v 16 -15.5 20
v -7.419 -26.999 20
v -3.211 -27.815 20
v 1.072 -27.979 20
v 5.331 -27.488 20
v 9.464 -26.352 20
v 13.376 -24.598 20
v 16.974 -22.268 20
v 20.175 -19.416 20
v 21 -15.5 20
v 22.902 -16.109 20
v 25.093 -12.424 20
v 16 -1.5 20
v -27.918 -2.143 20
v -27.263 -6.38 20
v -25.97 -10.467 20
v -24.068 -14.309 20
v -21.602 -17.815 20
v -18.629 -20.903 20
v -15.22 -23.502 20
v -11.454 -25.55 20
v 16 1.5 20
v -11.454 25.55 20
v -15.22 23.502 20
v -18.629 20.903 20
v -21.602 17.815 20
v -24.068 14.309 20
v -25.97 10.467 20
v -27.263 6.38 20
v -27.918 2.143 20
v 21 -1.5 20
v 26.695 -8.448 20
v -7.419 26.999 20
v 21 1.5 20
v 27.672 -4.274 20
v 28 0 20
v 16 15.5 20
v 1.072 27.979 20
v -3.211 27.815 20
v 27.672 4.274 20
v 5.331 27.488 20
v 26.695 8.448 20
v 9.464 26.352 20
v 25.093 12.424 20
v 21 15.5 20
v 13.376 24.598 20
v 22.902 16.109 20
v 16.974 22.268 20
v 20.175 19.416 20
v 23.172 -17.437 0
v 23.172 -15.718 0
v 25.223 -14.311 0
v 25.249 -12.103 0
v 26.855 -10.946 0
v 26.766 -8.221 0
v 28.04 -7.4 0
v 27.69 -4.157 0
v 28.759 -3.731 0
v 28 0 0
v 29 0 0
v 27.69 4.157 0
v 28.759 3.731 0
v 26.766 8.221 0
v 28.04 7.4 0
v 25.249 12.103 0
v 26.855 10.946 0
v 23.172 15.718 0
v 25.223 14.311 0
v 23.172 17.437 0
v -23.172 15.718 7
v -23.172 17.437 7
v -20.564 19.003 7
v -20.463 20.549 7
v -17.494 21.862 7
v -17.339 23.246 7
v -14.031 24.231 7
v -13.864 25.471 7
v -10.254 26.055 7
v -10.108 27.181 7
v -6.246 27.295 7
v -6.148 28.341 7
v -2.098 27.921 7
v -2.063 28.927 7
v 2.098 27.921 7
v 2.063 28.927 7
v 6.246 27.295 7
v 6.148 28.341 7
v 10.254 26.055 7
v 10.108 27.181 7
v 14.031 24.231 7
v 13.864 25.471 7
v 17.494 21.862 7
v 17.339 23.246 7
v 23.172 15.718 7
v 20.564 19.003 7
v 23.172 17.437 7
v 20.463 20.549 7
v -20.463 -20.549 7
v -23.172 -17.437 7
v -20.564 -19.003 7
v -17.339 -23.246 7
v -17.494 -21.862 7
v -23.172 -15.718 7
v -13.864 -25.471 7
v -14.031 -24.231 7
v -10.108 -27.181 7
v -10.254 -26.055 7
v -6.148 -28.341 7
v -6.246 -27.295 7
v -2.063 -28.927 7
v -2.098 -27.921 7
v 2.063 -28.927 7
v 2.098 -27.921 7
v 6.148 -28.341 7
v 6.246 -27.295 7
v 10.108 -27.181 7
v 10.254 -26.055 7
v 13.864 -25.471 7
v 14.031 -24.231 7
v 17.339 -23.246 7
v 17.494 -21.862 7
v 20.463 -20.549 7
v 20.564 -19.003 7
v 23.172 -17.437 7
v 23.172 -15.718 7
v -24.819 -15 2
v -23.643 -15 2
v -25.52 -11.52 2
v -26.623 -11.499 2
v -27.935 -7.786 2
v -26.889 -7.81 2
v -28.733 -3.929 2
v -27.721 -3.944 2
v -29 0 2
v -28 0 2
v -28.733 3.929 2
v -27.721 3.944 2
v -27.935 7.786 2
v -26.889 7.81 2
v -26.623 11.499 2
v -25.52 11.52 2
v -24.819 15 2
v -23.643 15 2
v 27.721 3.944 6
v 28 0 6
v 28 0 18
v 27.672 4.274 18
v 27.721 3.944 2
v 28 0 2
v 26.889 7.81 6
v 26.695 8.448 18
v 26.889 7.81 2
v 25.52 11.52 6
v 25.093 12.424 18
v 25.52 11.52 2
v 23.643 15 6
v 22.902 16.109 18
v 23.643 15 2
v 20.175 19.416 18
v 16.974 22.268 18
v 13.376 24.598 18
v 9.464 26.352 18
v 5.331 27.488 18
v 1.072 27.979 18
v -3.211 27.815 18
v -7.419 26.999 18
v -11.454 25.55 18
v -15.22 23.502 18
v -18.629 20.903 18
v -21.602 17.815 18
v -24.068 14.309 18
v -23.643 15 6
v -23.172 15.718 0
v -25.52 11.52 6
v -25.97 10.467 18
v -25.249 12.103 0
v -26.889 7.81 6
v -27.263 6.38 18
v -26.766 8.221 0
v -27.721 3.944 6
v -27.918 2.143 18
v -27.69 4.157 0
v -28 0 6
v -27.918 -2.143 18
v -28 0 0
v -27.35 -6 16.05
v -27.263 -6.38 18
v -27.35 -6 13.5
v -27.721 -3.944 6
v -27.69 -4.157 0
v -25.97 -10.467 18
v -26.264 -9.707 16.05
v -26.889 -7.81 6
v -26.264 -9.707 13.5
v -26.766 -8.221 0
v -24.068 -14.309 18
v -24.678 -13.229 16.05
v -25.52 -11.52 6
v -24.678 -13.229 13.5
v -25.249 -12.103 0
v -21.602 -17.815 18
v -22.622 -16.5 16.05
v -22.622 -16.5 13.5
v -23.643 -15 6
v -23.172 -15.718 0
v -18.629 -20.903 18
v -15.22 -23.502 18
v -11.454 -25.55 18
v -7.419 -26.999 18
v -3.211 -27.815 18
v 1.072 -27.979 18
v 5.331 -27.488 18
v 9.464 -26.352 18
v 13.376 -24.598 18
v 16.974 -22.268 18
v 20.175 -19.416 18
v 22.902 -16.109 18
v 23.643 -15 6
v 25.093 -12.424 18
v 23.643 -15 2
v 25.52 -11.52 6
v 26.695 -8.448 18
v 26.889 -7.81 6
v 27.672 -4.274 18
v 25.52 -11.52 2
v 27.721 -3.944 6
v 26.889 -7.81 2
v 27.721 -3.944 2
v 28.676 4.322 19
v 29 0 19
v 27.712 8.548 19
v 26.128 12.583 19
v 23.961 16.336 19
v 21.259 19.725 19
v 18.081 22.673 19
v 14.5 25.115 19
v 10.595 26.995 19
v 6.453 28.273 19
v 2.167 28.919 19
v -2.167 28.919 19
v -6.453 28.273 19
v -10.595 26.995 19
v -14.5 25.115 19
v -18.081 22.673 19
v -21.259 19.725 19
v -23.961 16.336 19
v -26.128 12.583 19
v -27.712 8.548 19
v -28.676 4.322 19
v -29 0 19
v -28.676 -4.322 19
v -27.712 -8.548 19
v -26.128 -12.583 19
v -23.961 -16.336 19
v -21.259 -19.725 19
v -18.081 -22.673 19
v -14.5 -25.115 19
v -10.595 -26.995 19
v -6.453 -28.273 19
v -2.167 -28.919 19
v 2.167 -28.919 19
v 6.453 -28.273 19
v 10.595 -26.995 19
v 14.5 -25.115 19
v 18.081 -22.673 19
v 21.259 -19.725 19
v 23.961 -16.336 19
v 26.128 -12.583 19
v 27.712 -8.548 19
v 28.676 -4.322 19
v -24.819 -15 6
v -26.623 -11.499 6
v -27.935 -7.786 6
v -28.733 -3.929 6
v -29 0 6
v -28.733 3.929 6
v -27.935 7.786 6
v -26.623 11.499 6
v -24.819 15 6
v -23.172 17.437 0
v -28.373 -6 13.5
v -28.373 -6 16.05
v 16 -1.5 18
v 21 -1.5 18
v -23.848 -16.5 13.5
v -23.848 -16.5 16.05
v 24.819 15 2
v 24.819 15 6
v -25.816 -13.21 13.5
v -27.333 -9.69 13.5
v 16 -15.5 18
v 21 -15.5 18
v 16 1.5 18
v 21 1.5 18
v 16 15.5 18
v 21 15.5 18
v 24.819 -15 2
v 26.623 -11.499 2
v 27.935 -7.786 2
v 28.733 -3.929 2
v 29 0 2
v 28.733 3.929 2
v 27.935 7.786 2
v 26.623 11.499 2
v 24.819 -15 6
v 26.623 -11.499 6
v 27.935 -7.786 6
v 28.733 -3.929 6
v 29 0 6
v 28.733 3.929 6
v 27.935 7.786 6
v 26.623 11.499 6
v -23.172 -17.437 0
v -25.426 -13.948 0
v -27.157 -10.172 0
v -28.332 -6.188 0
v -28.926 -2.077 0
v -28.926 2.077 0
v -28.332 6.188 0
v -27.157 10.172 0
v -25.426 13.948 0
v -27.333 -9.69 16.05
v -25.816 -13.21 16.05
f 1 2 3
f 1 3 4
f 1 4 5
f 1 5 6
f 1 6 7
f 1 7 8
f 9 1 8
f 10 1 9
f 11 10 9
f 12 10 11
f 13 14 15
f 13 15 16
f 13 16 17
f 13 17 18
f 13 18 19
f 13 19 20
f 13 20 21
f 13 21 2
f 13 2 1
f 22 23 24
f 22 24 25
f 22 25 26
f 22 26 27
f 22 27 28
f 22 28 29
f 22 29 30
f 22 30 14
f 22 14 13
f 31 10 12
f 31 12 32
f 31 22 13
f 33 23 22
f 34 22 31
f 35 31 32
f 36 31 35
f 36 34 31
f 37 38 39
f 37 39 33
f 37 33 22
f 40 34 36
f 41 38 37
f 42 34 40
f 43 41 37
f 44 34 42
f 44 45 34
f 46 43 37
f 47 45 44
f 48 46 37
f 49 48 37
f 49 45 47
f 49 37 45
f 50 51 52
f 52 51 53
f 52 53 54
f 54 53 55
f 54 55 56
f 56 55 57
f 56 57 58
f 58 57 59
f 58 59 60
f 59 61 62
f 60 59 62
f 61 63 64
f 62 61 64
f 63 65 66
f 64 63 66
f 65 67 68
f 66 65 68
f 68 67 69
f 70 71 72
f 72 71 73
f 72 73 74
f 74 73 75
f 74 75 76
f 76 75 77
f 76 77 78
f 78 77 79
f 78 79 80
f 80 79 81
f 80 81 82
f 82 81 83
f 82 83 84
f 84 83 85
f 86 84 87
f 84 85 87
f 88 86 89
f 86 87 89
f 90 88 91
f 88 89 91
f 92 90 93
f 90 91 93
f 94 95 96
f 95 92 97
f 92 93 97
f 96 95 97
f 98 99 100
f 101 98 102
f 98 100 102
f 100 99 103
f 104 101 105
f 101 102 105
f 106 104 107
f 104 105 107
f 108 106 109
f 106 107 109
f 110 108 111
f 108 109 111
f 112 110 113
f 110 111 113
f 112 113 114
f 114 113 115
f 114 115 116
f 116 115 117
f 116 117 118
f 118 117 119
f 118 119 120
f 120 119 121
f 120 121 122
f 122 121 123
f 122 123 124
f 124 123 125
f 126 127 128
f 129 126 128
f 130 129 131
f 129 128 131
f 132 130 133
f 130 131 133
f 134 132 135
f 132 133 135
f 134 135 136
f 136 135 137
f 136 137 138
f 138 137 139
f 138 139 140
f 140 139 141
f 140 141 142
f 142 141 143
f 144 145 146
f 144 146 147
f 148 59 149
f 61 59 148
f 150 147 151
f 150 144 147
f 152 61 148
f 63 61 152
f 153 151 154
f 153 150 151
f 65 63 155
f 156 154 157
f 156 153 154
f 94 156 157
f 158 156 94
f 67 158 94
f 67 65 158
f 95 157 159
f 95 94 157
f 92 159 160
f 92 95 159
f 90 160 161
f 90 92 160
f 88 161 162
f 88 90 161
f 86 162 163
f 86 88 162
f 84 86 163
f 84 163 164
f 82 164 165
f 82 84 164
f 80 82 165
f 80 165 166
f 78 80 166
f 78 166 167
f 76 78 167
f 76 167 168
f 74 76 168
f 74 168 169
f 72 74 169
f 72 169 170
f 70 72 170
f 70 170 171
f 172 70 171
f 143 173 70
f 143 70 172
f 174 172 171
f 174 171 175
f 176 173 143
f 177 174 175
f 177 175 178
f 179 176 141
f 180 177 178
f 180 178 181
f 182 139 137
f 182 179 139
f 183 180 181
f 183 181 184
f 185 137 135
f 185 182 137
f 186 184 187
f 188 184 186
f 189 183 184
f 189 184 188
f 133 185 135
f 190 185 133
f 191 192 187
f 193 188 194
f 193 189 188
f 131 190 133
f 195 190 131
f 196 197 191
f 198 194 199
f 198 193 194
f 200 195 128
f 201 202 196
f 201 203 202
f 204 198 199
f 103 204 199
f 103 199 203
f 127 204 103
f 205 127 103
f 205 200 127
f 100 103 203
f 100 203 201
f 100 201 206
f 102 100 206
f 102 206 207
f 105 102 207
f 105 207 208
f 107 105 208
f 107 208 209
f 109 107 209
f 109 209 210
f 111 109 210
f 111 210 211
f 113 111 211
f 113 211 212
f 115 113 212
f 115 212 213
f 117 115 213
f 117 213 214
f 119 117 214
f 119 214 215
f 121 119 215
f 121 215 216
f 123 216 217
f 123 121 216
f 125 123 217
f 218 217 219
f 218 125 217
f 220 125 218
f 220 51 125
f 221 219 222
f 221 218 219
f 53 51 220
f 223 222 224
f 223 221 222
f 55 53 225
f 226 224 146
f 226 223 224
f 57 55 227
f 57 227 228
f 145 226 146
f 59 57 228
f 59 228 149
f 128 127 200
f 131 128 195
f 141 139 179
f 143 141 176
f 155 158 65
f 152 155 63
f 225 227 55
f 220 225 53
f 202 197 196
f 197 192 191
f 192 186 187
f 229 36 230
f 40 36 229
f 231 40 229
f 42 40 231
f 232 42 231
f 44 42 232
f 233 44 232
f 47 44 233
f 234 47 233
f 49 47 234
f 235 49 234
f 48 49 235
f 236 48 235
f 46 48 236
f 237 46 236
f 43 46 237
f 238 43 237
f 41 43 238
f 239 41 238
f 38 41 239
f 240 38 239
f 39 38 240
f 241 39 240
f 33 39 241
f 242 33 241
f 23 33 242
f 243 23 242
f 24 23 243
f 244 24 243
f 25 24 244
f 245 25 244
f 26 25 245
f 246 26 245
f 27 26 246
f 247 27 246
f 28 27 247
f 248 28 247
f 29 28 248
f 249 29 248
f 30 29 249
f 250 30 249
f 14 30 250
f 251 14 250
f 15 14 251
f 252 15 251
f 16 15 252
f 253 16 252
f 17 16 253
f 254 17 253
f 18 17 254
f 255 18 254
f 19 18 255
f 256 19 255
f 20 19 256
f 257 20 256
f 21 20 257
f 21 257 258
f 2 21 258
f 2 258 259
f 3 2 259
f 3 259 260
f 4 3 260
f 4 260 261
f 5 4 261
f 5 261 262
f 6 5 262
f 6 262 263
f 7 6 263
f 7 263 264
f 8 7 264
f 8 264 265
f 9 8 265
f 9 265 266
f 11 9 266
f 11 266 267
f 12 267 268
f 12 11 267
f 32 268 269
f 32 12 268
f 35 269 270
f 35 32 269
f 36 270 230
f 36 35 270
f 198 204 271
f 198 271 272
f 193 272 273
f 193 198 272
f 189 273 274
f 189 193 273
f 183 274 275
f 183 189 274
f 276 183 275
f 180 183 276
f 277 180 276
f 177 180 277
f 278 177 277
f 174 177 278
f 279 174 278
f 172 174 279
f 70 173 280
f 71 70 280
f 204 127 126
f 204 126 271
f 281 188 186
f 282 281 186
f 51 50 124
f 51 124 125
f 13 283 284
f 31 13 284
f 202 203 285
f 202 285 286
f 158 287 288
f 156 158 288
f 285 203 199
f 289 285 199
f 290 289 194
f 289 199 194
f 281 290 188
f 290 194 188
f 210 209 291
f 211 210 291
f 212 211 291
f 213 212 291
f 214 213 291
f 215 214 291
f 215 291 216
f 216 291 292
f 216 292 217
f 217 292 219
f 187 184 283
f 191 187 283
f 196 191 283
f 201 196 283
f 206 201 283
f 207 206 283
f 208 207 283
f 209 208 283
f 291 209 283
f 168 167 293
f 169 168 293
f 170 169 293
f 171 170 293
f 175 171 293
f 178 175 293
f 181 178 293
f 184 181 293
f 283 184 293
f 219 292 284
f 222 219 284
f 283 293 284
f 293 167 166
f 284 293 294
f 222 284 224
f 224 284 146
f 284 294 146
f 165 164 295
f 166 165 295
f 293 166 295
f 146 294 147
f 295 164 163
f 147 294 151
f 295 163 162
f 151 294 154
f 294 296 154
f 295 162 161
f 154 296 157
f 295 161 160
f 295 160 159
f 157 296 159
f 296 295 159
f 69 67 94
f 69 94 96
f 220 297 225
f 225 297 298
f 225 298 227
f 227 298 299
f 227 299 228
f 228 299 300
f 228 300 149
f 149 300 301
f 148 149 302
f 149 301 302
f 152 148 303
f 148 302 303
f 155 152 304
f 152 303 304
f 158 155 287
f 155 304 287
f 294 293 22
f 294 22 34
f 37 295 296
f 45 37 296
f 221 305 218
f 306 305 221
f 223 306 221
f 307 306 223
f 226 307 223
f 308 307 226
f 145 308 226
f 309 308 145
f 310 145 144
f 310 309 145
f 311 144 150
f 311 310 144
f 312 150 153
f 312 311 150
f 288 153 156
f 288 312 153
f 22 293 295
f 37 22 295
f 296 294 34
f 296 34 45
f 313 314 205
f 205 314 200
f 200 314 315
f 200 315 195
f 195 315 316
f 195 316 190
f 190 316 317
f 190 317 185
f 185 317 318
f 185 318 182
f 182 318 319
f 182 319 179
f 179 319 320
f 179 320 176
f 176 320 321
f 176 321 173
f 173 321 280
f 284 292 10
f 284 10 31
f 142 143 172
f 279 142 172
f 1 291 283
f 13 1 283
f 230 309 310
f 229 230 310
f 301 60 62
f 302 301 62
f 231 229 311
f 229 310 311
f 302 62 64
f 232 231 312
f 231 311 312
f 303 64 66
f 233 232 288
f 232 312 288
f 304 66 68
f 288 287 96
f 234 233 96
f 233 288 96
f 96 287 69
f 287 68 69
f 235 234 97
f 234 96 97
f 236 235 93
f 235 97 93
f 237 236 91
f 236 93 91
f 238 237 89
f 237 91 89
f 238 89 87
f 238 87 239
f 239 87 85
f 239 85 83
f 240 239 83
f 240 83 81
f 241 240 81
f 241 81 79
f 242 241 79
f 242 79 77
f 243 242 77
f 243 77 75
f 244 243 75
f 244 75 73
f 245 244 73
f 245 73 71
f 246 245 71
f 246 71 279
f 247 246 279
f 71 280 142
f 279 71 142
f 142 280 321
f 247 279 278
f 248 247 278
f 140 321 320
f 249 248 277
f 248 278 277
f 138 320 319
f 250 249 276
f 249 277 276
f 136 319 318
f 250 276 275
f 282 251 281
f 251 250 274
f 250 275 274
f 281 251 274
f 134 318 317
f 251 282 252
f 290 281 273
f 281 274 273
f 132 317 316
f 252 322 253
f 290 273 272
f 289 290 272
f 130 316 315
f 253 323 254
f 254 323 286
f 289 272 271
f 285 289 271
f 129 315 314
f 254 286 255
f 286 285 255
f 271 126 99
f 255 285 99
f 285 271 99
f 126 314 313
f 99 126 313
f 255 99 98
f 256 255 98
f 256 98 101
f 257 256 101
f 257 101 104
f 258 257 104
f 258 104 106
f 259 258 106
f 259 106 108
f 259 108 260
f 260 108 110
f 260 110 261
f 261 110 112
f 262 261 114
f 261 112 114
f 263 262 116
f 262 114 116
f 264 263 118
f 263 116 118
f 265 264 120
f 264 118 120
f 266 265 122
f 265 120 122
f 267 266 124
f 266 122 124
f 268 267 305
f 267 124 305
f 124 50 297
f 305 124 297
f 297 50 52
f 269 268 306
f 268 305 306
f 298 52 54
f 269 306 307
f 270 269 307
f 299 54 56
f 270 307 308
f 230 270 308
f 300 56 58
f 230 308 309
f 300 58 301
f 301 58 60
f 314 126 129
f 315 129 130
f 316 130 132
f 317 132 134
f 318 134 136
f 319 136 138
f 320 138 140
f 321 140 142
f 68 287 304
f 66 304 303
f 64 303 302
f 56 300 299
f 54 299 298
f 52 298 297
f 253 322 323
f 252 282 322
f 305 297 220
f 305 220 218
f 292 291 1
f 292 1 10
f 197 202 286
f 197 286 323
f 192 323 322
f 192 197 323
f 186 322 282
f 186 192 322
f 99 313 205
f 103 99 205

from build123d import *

# Parameters (mm, degrees)
F0_R      = 29
F4_DEPTH  = 20
F5_SIZE   = 1
F1_R      = 28
F6_DEPTH  = 18
F2_W      = 5
F2_H      = 14
F7_DEPTH  = 20.1
F3_W      = 10.5
F3_H      = 2.55
F8_DEPTH  = 42.4
F9_W      = 46.34465
F9_H      = 65.188974
F10_DEPTH = 7
F11_W     = 30
F11_H     = 4
F12_DEPTH = 45


with BuildPart() as f4:
    # F0 (on Top) → F4 (new body)
    with BuildSketch(Plane.XY):
        Circle(F0_R)
    extrude(amount=F4_DEPTH)

    # F5
    f5_edges = [f4.edges().sort_by_distance(p)[0] for p in [
        (-29, 0, 20),
    ]]
    chamfer(f5_edges, length=F5_SIZE)

    # F1 (on Top) → F6 (cut)
    with BuildSketch(Plane.XY):
        Circle(F1_R)
    extrude(amount=F6_DEPTH, mode=Mode.SUBTRACT)

    # F2 (on face) → F7 (cut)
    with BuildSketch(Plane.XY):
        with Locations((18.5, 8.5)):
            Rectangle(F2_W, F2_H)
        with Locations((18.5, -8.5)):
            Rectangle(F2_W, F2_H)
    extrude(amount=F7_DEPTH, mode=Mode.SUBTRACT)

    # F3 (on Right) → F8 (cut)
    with BuildSketch(Plane.YZ):
        with Locations((-11.250031, 14.775)):
            Rectangle(F3_W, F3_H)
    extrude(amount=-F8_DEPTH, mode=Mode.SUBTRACT)

    # F9 (on Top) → F10 (cut)
    with BuildSketch(Plane.XY):
        Rectangle(F9_W, F9_H)
    extrude(amount=F10_DEPTH, mode=Mode.SUBTRACT)

    # F11 (on Right) → F12 (cut, symmetric)
    with BuildSketch(Plane.YZ):
        with Locations((0, 4)):
            Rectangle(F11_W, F11_H)
    extrude(amount=F12_DEPTH, both=True, mode=Mode.SUBTRACT)


solid = f4.part
